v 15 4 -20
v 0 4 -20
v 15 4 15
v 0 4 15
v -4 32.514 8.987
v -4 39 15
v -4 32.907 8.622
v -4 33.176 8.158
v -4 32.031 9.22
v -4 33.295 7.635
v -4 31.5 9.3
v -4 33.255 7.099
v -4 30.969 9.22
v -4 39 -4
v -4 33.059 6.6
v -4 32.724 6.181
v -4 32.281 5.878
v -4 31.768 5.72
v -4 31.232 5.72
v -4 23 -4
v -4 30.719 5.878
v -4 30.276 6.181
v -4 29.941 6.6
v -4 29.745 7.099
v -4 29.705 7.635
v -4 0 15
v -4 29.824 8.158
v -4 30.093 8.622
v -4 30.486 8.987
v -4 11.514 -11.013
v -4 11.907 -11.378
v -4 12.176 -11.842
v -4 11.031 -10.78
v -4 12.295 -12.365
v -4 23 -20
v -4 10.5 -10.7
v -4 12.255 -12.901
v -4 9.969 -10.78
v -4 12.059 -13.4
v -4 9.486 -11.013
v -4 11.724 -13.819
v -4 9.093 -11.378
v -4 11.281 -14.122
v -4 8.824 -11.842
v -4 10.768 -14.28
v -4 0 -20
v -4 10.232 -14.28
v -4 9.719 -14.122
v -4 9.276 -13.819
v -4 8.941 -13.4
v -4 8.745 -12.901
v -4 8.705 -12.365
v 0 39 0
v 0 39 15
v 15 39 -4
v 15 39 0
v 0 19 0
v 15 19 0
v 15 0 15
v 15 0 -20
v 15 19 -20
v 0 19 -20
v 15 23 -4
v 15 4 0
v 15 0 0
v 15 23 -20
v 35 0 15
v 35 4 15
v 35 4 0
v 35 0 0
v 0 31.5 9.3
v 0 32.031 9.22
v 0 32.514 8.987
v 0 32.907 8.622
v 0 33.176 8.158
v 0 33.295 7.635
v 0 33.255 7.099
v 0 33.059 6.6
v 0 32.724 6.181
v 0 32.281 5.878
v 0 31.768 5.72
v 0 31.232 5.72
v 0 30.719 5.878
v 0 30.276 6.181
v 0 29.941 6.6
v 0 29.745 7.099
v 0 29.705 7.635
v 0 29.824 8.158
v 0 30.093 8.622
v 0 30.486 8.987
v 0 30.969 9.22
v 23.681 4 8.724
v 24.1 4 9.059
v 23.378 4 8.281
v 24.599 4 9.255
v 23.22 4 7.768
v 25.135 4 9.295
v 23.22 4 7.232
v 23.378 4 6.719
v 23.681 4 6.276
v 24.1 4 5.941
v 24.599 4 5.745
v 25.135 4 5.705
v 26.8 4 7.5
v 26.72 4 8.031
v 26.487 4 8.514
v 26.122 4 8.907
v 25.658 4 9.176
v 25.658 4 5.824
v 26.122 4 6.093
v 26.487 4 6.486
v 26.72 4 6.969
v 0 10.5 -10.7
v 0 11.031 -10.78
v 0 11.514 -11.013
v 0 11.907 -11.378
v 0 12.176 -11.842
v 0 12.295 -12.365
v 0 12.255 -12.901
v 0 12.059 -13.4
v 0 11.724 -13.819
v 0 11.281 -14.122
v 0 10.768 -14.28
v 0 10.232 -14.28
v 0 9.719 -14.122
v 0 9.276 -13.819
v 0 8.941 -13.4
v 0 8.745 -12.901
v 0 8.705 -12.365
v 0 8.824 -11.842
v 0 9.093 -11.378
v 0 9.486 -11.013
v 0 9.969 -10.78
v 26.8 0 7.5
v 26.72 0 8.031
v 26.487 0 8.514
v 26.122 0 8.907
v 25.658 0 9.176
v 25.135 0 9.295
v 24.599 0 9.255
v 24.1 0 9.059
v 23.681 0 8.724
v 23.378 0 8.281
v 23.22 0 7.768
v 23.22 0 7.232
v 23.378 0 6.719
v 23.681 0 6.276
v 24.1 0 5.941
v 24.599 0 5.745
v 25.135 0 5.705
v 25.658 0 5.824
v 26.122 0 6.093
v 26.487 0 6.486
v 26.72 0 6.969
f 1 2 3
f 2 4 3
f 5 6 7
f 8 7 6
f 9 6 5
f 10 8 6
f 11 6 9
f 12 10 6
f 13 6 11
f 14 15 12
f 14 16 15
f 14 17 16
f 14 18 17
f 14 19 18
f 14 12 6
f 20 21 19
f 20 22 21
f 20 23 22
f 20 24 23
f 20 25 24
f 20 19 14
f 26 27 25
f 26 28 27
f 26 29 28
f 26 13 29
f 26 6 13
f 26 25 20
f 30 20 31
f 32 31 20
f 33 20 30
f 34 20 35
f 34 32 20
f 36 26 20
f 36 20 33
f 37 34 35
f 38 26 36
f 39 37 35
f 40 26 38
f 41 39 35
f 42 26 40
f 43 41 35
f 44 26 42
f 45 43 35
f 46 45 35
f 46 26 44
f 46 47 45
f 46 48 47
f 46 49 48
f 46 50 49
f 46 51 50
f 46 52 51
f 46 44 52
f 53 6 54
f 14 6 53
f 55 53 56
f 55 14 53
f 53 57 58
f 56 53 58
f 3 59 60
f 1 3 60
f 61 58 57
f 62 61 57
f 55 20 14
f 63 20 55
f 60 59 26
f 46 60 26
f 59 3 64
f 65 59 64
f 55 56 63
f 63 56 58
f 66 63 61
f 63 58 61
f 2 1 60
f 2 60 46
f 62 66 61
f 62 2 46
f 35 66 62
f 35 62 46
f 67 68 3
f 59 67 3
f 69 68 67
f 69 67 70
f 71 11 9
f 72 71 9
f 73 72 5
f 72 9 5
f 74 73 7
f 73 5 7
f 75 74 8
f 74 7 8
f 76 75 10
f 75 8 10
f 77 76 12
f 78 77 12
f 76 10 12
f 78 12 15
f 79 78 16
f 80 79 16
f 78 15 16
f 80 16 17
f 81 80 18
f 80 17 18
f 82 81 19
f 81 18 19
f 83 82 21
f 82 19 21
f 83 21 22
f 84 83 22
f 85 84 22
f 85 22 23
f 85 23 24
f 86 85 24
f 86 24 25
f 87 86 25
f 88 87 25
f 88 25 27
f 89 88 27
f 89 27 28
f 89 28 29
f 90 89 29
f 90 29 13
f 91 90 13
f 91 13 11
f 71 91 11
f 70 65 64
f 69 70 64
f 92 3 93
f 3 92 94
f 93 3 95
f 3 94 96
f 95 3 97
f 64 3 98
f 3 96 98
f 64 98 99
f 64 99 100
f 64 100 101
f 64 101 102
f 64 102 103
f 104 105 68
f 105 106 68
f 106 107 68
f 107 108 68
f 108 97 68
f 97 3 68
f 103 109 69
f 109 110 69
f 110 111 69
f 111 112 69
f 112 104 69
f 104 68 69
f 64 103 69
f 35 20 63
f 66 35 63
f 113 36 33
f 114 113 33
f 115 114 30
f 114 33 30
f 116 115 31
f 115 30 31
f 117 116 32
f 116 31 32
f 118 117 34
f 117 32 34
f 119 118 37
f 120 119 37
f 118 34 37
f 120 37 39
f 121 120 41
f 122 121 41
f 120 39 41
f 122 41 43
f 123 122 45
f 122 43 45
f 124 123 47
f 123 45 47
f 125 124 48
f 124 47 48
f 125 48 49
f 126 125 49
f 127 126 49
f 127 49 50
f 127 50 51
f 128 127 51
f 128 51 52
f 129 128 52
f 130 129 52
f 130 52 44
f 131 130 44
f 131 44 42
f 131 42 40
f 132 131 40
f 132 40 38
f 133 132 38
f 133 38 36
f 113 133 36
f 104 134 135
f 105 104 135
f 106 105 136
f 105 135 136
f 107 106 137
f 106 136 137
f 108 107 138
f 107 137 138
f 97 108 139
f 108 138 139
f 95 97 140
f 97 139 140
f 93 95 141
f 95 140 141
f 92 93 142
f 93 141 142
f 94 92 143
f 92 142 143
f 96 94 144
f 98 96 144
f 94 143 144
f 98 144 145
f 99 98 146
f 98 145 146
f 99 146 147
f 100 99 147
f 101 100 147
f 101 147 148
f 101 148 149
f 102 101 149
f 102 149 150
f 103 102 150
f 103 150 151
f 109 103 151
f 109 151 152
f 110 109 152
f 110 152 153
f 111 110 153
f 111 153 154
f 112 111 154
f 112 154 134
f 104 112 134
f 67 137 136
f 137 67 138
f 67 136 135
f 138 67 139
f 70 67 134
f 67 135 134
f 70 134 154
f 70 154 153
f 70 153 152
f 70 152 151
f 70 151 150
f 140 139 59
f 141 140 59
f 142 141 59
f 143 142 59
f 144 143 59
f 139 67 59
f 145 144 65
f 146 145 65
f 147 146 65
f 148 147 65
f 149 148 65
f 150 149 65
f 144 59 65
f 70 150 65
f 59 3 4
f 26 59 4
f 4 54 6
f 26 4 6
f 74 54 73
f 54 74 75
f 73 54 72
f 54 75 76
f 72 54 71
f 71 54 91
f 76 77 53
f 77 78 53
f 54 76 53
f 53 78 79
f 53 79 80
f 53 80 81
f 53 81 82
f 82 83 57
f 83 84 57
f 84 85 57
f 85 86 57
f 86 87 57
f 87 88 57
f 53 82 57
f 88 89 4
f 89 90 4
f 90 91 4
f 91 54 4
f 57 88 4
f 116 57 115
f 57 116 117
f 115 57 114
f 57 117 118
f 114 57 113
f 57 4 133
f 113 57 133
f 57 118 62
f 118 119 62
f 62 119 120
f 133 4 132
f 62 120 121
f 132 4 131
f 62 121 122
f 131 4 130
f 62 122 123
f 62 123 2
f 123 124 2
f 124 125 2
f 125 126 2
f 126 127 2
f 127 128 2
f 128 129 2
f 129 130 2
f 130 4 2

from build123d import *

# Parameters (mm, degrees)
SKETCH_1_W          = 4
SKETCH_1_H          = 19
SKETCH_1_W_2        = 15
SKETCH_1_H_2        = 4
EXTRUDE_1_DEPTH     = 15
SKETCH_2_W          = 19
SKETCH_2_H          = 19
EXTRUDE_2_DEPTH     = 4
EXTRUDE_3_DEPTH     = 20
EXTRUDE_5_DEPTH     = 20
EXTRUDE_6_DEPTH     = 20
SKETCH_7_W          = 19
SKETCH_7_H          = 4
EXTRUDE_7_DEPTH     = 16
SKETCH_8_R          = 1.8
CUT_EXTRUDE_1_DEPTH = 12
SKETCH_9_R          = 1.8
CUT_EXTRUDE_2_DEPTH = 12
SKETCH1_W           = 4
SKETCH1_H           = 15
SKETCH1_W_2         = 4.010548523
SKETCH1_H_2         = 14
CUT_EXTRUDE2_DEPTH  = 20
SKETCH2_W           = 4
SKETCH2_H           = 4
CUT_EXTRUDE3_DEPTH  = 20
CUT_EXTRUDE4_DEPTH  = 4


with BuildPart() as part:
    # 草图1 → 凸台-拉伸1 (new body)
    with BuildSketch(Plane.XY):
        with Locations((-2, 9.5)):
            Rectangle(SKETCH_1_W, SKETCH_1_H)
        with Locations((7.5, 2)):
            Rectangle(SKETCH_1_W_2, SKETCH_1_H_2)
    extrude(amount=EXTRUDE_1_DEPTH)

    # 草图2 → 凸台-拉伸2 (add)
    with BuildSketch(Plane.XY.offset(15)):
        with Locations((5.5, 9.5)):
            Rectangle(SKETCH_2_W, SKETCH_2_H)
    extrude(amount=EXTRUDE_2_DEPTH)

    # 草图3 → 凸台-拉伸3 (add)
    with BuildSketch(Plane(origin=(0, 0, 0), x_dir=(-1, 0, 0), z_dir=(0, 0, -1))):
        Polygon((-15, 19), (0, 19), (0, 4), (-15, 4), (-15, 0), (4, 0), (4, 23), (-15, 23), align=None)
    extrude(amount=EXTRUDE_3_DEPTH)



with BuildPart() as body_2:
    # 草图5 → 凸台-拉伸5 (new body)
    with BuildSketch(Plane(origin=(15, 0, 0), x_dir=(0, 0, -1), z_dir=(1, 0, 0))):
        Polygon((-19, 0), (-15, 0), (0, 0), (4, 0), (4, 18), (0, 18), (0, 4), (-15, 4), (-15, 19), (-19, 19), align=None)
    extrude(amount=EXTRUDE_5_DEPTH)

    # 草图9 → 切除-拉伸2 (cut)
    with BuildSketch(Plane.XZ):
        with Locations((25, 7.5)):
            Circle(SKETCH_9_R)
    extrude(amount=-CUT_EXTRUDE_2_DEPTH, mode=Mode.SUBTRACT)

    # Sketch1 → Cut-Extrude2 (cut)
    with BuildSketch(Plane(origin=(35, 0, 0), x_dir=(0, 0, -1), z_dir=(1, 0, 0))):
        with Locations((-17, 11.5)):
            Rectangle(SKETCH1_W, SKETCH1_H)
        with Locations((2.005274262, 11)):
            Rectangle(SKETCH1_W_2, SKETCH1_H_2)
    extrude(amount=-CUT_EXTRUDE2_DEPTH, mode=Mode.SUBTRACT)

    # Sketch2 → Cut-Extrude3 (cut)
    with BuildSketch(Plane(origin=(35, 0, 0), x_dir=(0, 0, -1), z_dir=(1, 0, 0))):
        with Locations((2, 2)):
            Rectangle(SKETCH2_W, SKETCH2_H)
    extrude(amount=-CUT_EXTRUDE3_DEPTH, mode=Mode.SUBTRACT)


with BuildPart() as body_3:
    # 草图6 → 凸台-拉伸6 (new body)
    with BuildSketch(Plane(origin=(0, 19, 0), x_dir=(1, 0, 0), z_dir=(0, 1, 0))):
        Polygon((-4, -19), (15, -19), (15, -15), (0, -15), (0, 0), (-4, 0), (-4, -16), align=None)
    extrude(amount=EXTRUDE_6_DEPTH)


with BuildPart() as part_1:
    add(part.part)

    add(body_3.part)  # 凸台-拉伸7 merges body 3
    # 草图7 → 凸台-拉伸7 (add)
    with BuildSketch(Plane(origin=(0, 23, 0), x_dir=(1, 0, 0), z_dir=(0, 1, 0))):
        with Locations((5.5, 2)):
            Rectangle(SKETCH_7_W, SKETCH_7_H)
    extrude(amount=EXTRUDE_7_DEPTH)

    # 草图8 → 切除-拉伸1 (cut)
    with BuildSketch(Plane.ZY.offset(4)):
        with Locations((7.5, 31.5)):
            Circle(SKETCH_8_R)
        with Locations((-12.5, 10.5)):
            Circle(SKETCH_8_R)
    extrude(amount=-CUT_EXTRUDE_1_DEPTH, mode=Mode.SUBTRACT)


with BuildPart() as cut_extrude4_tool:
    # Sketch3 → Cut-Extrude4 (new body)
    with BuildSketch(Plane.XY.offset(19)):
        Polygon((-4, 39), (15, 39), (15, 4), (35, 4), (35, 0), (-4, 0), align=None)
    extrude(amount=-CUT_EXTRUDE4_DEPTH)


with BuildPart() as part_2:
    add(part_1.part)

    # Cut-Extrude4: cut by cut_extrude4_tool
    add(cut_extrude4_tool.part, mode=Mode.SUBTRACT)


with BuildPart() as body_2_1:
    add(body_2.part)

    # Cut-Extrude4: cut by cut_extrude4_tool
    add(cut_extrude4_tool.part, mode=Mode.SUBTRACT)


solid = Compound([part_2.part, body_2_1.part])
